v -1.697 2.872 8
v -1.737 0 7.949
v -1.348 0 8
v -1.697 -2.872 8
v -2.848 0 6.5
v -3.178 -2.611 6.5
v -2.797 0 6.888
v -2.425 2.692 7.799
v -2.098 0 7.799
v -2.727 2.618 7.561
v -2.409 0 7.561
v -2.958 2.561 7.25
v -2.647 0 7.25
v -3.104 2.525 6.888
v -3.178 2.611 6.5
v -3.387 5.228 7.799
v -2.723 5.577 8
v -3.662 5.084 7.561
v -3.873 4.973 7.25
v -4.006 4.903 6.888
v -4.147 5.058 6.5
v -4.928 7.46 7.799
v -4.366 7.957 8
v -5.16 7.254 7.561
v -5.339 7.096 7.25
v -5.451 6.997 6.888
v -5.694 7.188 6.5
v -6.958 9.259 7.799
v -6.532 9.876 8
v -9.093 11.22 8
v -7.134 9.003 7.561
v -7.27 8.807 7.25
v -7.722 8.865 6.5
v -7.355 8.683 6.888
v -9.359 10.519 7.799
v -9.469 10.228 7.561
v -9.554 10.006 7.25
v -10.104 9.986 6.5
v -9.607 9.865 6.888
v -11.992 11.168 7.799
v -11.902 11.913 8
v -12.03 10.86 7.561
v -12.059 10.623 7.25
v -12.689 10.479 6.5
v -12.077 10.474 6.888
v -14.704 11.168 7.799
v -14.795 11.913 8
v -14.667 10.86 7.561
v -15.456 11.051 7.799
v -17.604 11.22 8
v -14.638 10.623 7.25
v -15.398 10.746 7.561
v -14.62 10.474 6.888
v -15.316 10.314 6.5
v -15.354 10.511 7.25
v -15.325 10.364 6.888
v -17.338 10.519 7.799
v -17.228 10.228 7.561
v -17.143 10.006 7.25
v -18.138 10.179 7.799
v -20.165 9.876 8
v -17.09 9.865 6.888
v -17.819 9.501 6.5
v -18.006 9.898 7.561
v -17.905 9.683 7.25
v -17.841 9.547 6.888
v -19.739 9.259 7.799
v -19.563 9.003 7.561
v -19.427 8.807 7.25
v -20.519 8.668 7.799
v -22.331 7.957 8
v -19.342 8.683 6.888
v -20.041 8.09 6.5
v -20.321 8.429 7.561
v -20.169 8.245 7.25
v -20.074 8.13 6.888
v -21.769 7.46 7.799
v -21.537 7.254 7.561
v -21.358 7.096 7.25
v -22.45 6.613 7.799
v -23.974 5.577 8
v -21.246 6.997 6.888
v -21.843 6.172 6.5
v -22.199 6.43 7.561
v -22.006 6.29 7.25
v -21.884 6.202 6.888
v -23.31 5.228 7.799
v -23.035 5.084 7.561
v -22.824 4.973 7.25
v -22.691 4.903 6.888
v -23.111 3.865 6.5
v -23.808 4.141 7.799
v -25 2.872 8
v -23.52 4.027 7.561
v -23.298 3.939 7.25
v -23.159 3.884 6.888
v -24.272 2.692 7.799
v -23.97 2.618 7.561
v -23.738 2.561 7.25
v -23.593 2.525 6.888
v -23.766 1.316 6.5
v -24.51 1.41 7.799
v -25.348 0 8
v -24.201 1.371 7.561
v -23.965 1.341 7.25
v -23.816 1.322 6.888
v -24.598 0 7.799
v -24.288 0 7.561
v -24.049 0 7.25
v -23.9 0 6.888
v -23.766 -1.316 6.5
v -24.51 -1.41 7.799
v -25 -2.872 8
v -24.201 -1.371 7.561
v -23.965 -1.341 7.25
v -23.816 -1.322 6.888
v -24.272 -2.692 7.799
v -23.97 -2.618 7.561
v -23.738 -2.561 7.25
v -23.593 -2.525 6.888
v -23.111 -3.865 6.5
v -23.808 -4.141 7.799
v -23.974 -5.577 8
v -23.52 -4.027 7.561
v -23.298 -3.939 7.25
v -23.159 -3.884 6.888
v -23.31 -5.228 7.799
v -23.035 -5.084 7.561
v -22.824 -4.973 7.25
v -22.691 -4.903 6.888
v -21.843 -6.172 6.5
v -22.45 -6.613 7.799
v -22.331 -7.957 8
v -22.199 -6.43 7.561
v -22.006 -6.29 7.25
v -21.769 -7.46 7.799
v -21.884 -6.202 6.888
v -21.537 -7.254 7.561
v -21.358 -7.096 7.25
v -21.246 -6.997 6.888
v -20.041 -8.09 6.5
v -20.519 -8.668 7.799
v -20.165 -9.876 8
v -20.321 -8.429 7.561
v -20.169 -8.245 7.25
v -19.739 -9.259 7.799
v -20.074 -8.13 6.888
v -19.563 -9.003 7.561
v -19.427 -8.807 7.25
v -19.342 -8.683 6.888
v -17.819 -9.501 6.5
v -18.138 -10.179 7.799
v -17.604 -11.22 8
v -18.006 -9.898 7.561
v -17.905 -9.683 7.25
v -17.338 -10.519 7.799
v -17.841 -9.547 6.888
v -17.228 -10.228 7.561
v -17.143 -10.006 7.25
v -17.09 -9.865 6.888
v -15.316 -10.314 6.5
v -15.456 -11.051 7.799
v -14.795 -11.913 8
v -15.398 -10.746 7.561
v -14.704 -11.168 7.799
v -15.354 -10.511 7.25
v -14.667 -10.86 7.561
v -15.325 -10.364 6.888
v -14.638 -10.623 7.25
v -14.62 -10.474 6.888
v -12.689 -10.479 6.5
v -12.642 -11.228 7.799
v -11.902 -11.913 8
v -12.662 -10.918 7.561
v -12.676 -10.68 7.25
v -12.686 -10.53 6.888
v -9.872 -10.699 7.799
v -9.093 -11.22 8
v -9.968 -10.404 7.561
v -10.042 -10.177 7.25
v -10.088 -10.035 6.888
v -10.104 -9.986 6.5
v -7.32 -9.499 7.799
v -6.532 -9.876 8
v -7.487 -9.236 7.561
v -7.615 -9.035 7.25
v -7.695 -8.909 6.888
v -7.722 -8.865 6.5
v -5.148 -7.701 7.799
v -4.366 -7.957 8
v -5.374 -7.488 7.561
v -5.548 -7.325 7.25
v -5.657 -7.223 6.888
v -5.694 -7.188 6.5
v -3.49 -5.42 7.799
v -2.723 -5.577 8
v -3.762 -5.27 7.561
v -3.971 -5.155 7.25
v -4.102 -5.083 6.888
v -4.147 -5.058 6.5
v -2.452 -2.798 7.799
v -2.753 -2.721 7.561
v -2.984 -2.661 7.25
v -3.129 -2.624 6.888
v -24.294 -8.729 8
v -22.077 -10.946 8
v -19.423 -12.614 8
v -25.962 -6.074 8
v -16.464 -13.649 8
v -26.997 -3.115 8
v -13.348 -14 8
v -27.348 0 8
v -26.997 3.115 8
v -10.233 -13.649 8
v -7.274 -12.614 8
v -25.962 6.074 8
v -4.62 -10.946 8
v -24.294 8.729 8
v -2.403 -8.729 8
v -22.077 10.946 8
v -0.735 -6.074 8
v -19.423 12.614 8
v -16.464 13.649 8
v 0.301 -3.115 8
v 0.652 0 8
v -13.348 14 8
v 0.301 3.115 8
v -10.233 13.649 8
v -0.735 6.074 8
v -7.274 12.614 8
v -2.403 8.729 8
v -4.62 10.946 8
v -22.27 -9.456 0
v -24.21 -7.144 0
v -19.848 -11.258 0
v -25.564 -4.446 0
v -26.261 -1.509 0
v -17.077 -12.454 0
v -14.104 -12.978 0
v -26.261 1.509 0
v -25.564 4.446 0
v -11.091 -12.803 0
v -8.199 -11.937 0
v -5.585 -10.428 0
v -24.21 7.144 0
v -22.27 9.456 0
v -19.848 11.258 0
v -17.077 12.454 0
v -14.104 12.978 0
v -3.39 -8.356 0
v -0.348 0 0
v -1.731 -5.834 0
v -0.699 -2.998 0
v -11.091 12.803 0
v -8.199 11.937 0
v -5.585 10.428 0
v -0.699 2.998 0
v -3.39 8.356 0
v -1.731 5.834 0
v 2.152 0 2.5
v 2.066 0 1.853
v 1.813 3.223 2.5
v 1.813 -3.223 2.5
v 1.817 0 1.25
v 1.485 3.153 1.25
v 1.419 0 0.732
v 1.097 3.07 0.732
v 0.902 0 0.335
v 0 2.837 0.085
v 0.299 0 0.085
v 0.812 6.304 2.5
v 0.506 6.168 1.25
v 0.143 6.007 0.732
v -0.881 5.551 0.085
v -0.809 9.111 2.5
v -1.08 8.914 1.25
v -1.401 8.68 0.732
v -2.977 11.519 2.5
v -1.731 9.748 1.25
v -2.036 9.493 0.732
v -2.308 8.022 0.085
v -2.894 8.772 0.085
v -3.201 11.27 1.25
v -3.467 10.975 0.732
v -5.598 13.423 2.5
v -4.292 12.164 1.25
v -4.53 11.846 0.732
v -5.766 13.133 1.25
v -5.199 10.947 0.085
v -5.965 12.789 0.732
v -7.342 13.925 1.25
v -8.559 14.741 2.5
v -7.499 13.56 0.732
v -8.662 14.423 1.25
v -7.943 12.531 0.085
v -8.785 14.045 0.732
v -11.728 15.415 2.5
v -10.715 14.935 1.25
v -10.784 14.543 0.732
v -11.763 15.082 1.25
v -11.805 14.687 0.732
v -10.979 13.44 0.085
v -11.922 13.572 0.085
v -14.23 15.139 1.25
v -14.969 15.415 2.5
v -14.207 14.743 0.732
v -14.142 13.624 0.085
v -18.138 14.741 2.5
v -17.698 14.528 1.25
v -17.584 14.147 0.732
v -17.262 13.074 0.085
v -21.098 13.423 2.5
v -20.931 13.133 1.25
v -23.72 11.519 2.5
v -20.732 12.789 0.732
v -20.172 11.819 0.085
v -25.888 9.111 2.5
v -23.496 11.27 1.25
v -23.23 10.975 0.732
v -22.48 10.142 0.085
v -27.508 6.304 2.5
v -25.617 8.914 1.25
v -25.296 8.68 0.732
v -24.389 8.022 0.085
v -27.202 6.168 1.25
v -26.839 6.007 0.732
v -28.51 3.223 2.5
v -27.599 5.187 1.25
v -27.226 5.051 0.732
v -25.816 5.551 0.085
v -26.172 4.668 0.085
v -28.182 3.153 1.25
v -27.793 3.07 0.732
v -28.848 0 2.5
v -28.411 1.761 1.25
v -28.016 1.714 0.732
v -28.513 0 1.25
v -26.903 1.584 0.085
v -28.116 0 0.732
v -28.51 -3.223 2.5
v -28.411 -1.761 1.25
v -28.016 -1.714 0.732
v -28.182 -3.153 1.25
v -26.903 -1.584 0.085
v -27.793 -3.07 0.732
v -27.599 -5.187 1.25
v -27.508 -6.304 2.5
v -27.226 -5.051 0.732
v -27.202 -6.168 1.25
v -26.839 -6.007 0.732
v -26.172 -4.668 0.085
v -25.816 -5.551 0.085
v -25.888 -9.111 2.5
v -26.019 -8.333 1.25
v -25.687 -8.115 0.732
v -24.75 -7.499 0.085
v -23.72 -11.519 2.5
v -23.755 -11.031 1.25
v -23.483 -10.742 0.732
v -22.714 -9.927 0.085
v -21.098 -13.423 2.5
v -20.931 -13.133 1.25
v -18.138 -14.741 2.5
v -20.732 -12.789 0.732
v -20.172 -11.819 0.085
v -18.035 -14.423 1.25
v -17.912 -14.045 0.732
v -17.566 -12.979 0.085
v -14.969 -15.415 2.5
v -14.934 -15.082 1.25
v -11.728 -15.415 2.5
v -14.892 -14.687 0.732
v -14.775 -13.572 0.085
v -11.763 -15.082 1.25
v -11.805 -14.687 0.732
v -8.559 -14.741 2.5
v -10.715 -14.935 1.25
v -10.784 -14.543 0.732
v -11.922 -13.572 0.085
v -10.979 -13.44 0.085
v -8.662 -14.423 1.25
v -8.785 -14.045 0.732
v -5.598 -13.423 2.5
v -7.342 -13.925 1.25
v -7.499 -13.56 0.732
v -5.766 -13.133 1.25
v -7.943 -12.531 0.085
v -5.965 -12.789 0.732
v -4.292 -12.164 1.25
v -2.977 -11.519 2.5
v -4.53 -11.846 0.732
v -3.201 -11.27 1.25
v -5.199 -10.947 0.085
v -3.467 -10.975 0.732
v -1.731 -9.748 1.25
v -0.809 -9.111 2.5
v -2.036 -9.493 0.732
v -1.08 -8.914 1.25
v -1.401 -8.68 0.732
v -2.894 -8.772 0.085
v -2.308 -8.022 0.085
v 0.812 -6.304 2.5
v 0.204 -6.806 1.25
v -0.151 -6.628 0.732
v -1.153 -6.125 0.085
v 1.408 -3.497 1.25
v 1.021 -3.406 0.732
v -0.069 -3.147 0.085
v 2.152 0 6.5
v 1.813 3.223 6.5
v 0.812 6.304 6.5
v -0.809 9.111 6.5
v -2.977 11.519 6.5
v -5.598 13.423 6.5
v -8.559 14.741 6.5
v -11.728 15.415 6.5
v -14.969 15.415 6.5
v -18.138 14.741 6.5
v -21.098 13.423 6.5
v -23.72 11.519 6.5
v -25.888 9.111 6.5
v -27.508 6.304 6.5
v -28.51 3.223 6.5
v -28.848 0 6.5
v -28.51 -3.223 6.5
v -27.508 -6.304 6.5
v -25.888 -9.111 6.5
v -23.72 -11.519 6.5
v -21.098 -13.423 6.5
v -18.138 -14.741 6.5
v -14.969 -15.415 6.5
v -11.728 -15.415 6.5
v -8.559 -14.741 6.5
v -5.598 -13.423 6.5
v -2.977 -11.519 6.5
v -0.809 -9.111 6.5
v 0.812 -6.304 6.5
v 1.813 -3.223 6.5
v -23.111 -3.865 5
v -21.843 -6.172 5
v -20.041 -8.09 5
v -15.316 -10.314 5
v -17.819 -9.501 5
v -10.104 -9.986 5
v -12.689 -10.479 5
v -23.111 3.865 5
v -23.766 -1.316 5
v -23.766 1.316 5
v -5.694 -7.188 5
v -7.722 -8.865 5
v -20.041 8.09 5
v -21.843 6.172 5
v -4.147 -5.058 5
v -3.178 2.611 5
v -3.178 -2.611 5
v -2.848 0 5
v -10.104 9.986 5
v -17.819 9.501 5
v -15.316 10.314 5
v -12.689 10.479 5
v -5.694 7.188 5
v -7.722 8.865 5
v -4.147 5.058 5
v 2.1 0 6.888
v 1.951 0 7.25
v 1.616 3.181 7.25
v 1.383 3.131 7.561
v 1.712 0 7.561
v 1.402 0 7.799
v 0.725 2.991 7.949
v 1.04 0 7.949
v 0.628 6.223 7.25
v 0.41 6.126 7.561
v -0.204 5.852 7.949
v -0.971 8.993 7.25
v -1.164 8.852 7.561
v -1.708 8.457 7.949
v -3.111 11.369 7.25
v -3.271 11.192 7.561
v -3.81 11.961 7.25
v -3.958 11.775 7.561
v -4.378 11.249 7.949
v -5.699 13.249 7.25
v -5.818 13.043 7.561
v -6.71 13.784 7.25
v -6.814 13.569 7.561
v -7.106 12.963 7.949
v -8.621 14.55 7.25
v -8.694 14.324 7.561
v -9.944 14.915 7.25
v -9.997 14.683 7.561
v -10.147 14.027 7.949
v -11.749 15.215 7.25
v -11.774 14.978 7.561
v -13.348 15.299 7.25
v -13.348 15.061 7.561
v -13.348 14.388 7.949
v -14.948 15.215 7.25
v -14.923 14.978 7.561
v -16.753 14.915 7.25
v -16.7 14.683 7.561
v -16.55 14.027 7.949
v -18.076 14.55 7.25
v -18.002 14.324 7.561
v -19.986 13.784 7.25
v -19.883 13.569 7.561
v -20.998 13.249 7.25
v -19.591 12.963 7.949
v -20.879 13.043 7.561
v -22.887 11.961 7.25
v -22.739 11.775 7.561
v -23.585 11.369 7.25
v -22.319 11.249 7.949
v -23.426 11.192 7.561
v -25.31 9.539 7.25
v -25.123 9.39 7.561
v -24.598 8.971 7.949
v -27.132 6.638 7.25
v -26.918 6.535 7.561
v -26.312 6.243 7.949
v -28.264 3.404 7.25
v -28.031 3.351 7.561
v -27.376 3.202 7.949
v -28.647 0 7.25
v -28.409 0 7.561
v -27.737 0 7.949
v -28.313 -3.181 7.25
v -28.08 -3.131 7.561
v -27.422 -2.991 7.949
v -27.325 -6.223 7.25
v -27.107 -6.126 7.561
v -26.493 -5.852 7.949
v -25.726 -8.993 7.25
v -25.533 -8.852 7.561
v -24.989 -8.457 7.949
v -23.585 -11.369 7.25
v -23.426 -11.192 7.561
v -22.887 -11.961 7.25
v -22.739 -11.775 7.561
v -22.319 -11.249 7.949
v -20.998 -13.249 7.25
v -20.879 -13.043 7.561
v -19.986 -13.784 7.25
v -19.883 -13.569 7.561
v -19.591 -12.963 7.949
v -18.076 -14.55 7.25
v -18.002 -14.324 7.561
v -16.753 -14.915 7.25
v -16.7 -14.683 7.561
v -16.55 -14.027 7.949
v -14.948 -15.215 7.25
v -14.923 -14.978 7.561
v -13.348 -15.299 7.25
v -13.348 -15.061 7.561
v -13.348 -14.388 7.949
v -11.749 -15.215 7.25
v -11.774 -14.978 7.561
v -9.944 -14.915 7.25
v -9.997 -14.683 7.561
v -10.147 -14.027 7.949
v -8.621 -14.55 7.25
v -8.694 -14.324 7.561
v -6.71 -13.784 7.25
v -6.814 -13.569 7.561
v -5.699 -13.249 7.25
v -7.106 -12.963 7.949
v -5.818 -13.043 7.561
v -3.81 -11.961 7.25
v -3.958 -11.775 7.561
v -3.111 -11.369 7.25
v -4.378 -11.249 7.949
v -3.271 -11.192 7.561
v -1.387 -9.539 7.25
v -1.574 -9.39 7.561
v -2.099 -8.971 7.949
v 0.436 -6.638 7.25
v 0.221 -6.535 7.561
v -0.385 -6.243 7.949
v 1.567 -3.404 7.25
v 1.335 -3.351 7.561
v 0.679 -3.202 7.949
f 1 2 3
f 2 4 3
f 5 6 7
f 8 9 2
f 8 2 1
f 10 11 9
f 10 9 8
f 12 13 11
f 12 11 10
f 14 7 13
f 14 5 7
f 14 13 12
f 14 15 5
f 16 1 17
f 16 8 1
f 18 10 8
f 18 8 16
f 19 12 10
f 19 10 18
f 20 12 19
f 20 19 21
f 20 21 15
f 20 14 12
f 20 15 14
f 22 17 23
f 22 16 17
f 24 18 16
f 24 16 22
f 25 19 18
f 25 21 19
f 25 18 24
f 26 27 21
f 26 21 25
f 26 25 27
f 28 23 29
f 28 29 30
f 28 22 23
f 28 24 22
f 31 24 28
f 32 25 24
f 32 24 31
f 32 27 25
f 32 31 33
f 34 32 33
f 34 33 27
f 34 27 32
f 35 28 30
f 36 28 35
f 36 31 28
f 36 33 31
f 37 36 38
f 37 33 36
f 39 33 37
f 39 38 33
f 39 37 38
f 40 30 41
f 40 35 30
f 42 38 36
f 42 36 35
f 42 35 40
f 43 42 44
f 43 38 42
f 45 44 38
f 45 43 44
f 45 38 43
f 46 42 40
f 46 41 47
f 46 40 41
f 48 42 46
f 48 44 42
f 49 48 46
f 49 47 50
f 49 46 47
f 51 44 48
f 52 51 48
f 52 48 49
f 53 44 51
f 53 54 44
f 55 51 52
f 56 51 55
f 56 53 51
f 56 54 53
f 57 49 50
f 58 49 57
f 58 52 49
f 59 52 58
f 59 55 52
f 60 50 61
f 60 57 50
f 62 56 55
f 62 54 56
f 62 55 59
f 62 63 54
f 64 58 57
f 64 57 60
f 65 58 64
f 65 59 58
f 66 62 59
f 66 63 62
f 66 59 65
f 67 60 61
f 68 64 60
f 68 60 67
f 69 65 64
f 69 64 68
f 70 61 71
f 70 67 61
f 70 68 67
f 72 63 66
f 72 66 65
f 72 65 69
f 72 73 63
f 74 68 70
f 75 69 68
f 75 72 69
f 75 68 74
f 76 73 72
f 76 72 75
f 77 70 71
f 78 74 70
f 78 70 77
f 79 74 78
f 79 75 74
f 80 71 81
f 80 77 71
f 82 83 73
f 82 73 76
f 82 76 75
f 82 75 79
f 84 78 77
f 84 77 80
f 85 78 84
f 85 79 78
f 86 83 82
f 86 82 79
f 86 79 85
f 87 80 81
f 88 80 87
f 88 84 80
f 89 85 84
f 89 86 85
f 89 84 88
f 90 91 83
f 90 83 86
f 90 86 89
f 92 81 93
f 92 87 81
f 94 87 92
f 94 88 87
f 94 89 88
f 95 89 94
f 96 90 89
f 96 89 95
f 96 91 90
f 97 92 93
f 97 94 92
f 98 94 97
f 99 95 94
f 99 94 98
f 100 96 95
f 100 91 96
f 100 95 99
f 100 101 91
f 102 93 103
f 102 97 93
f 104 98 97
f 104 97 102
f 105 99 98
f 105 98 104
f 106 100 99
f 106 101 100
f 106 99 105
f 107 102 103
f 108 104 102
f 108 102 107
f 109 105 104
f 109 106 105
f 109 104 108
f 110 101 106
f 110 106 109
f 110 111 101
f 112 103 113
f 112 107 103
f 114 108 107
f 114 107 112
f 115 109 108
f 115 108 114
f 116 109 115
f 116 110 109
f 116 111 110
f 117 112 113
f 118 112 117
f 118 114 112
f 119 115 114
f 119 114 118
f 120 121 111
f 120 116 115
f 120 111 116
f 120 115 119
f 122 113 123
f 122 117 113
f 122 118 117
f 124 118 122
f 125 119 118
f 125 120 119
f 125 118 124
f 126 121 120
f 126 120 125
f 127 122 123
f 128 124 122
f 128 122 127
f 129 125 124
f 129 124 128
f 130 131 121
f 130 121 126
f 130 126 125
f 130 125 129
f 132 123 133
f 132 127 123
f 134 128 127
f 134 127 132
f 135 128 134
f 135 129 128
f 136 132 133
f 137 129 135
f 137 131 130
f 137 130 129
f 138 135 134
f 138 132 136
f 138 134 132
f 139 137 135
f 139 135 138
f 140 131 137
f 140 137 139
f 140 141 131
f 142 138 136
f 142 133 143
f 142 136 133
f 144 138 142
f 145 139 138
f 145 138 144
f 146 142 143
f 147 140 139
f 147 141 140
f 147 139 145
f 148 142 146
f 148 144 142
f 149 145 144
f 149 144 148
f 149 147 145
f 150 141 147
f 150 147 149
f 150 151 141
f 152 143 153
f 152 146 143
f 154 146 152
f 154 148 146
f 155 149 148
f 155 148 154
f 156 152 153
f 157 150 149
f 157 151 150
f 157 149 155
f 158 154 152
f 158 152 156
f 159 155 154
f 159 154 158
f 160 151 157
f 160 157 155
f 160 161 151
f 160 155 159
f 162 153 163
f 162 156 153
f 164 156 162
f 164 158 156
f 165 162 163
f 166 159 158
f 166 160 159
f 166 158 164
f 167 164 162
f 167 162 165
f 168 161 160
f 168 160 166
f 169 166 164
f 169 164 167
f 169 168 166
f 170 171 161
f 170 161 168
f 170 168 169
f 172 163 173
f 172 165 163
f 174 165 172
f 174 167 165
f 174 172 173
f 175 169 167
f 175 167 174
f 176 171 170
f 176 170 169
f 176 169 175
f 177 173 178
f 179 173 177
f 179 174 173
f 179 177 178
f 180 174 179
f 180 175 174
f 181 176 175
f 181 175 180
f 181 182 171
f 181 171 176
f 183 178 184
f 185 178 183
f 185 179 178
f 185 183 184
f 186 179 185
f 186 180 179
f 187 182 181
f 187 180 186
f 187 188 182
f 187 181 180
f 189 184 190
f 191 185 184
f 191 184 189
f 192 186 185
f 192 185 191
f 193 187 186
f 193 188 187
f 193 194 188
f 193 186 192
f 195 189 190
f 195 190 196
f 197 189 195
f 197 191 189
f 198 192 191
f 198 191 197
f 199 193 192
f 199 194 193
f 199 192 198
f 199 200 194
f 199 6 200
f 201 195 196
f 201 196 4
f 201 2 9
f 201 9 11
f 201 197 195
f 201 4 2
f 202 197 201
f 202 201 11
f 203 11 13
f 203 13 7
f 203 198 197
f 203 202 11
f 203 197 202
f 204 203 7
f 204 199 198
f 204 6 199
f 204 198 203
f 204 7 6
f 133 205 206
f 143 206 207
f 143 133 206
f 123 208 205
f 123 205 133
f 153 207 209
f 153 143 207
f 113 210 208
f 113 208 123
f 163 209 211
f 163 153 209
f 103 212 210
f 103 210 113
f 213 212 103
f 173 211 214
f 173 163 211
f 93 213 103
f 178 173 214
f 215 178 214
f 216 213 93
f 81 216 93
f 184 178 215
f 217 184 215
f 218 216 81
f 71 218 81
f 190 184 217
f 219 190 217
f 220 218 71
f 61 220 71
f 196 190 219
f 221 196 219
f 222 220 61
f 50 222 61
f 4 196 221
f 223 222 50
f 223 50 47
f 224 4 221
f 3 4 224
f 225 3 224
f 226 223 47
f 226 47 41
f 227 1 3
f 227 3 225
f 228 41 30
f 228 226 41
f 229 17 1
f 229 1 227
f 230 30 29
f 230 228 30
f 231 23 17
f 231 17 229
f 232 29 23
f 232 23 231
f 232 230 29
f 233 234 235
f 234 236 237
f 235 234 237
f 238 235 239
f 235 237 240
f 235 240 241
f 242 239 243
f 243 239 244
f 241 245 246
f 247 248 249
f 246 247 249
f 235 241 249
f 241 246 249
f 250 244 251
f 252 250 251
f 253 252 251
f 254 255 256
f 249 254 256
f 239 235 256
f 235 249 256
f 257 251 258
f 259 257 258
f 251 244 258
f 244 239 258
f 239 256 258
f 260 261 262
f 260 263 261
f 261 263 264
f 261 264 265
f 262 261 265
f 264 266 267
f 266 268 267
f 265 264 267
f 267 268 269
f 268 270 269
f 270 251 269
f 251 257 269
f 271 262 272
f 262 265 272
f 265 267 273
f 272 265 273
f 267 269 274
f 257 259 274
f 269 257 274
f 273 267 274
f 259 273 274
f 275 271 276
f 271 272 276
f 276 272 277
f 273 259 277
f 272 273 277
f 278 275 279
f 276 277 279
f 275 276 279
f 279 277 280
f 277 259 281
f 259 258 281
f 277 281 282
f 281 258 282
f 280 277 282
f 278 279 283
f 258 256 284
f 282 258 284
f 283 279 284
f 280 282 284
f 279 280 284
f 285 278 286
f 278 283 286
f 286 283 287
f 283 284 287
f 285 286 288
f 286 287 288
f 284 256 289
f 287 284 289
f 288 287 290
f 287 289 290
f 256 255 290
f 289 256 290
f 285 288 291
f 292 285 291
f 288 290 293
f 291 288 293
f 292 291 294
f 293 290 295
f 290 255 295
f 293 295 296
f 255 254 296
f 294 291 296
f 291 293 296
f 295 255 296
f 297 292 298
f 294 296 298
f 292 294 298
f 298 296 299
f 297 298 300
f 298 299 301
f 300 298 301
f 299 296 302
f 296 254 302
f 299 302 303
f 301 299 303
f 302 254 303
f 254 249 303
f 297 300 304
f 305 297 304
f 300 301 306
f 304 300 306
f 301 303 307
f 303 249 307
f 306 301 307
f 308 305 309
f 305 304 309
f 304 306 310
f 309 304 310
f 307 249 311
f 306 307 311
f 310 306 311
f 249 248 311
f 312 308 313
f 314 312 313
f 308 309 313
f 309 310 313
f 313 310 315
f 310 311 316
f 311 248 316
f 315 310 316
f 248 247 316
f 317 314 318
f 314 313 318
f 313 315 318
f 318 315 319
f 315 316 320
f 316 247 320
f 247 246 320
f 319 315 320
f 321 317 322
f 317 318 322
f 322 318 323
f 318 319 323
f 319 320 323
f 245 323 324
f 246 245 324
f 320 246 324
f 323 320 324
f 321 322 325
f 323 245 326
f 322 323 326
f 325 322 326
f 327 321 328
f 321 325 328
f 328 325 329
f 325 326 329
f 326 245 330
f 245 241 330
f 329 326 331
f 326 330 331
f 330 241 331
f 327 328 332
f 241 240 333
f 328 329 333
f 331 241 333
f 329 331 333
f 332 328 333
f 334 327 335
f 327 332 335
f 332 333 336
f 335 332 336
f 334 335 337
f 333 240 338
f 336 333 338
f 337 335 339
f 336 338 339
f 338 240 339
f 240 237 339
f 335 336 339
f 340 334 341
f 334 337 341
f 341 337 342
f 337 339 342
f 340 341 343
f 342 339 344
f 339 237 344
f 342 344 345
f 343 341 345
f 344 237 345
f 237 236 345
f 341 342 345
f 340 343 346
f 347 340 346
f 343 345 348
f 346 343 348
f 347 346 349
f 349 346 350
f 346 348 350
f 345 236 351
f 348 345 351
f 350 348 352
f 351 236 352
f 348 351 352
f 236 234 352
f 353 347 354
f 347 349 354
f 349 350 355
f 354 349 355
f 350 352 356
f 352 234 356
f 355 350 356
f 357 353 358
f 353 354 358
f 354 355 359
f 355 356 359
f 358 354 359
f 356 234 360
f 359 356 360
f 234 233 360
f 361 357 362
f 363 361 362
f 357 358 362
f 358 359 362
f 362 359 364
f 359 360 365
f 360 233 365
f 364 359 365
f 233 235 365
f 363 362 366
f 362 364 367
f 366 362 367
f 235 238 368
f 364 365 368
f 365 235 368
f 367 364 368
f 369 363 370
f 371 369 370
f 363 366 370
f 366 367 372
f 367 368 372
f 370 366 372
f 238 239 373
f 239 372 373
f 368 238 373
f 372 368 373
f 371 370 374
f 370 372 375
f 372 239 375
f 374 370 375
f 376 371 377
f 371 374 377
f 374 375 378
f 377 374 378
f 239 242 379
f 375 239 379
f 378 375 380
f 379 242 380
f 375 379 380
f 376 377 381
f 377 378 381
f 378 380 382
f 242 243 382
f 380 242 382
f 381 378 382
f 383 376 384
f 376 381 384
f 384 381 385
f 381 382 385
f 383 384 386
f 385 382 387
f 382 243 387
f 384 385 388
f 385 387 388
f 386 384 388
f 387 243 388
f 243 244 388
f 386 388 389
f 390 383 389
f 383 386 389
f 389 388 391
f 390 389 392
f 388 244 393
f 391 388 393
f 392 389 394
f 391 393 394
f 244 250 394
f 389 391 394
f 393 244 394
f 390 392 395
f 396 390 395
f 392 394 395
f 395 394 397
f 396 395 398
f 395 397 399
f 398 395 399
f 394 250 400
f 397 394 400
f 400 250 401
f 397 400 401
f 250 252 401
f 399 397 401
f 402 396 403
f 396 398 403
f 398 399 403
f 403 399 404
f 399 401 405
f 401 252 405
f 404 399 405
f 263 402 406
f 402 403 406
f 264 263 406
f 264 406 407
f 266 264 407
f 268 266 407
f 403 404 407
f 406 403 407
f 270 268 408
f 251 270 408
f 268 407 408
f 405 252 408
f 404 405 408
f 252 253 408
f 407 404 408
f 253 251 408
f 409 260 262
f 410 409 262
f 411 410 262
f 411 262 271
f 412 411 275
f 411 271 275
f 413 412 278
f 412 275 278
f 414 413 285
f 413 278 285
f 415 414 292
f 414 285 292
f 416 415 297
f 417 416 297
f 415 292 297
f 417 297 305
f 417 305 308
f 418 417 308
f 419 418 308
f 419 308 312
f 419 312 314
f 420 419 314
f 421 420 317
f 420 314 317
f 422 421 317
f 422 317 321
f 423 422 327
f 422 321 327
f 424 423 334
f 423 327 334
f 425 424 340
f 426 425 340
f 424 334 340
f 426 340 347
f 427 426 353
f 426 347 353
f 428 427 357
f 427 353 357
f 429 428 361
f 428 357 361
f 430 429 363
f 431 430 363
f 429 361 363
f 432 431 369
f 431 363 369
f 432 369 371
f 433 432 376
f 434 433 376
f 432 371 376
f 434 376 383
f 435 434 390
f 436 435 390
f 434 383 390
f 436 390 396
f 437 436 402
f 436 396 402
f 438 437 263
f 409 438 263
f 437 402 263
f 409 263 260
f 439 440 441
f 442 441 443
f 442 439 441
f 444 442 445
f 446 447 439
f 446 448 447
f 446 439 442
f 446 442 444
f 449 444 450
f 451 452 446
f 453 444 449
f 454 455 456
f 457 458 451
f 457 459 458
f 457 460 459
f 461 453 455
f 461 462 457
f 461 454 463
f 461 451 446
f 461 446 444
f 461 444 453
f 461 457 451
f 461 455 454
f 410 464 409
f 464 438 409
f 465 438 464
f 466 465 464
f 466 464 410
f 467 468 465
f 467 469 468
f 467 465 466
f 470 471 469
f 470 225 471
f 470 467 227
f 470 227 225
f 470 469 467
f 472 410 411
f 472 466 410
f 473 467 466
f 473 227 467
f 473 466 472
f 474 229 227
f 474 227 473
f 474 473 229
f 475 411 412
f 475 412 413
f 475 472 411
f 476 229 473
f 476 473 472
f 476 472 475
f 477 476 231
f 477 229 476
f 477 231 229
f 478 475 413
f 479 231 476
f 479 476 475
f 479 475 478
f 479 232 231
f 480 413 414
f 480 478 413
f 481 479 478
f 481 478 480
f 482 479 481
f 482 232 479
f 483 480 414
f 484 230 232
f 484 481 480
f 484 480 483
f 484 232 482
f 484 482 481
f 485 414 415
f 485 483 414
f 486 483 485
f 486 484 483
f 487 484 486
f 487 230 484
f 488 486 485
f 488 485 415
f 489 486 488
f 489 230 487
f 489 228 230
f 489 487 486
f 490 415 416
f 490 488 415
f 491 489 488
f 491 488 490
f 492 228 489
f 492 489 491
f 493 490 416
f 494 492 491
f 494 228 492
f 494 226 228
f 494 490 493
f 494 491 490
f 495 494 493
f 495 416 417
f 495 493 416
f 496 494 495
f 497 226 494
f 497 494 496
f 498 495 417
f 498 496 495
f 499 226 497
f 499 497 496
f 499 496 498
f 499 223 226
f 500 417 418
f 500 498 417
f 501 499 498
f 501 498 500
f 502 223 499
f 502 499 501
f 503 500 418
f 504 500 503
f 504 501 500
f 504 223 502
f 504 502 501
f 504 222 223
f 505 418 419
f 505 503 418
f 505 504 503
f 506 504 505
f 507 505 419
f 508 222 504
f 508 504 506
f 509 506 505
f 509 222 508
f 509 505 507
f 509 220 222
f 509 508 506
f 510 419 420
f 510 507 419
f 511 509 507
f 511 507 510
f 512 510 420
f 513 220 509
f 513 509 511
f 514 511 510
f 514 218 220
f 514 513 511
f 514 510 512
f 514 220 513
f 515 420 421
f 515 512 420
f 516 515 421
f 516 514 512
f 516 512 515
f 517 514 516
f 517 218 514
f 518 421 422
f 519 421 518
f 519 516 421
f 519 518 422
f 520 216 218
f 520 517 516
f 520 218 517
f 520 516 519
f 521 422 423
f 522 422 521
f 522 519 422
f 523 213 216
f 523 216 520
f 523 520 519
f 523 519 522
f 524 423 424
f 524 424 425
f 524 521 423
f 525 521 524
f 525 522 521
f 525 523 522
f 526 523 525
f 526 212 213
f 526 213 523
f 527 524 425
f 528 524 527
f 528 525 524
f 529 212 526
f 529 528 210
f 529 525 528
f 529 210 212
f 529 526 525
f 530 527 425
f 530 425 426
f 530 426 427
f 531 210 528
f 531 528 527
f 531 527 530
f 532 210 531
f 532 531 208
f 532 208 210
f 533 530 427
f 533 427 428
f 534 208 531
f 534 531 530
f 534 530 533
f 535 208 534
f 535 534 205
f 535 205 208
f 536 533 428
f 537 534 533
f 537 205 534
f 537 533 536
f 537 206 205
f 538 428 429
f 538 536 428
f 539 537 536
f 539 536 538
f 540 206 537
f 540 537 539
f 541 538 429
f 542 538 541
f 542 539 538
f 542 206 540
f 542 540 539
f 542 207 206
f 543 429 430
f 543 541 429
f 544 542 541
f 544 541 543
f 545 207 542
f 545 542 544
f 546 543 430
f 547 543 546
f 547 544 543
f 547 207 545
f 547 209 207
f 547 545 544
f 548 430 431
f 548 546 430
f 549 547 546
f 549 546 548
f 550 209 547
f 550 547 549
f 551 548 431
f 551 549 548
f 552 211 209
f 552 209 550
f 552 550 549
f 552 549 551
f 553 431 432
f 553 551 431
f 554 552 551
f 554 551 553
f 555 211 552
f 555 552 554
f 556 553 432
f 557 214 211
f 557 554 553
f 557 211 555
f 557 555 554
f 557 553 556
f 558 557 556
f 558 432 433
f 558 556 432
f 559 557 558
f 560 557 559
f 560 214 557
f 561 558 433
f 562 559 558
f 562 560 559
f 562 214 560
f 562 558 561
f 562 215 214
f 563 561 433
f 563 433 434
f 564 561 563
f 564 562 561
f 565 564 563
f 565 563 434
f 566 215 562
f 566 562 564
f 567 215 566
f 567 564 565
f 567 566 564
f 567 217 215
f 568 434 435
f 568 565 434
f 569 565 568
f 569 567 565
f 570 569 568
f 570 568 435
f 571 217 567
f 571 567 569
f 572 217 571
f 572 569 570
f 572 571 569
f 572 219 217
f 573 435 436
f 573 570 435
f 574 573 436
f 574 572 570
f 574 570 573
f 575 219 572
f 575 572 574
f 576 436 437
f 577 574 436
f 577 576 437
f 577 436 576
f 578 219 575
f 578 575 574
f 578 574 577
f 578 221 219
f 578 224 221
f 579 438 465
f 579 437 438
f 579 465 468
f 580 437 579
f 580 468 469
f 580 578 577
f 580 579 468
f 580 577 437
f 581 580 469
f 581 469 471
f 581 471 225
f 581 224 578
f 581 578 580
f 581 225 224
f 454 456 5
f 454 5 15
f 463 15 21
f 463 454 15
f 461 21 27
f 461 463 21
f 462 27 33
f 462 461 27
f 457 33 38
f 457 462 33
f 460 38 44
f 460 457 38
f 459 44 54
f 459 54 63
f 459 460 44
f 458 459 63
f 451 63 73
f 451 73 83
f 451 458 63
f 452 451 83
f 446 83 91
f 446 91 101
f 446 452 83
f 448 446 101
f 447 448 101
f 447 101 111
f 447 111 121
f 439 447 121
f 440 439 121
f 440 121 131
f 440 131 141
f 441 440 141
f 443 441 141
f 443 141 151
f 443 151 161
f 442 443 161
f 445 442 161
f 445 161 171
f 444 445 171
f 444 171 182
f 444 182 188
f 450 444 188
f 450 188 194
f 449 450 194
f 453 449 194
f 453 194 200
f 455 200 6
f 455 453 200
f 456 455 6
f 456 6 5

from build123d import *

# Parameters (mm, degrees)
F0_R     = 15.5
F1_DEPTH = 8
F2_T     = -5
F3_R     = 1.5
F4_R     = 2.5


with BuildPart() as f1:
    # F0 (on Top) → F1 (new body)
    with BuildSketch(Plane.XY):
        with Locations((-13.3484182879, 0)):
            Circle(F0_R)
    extrude(amount=F1_DEPTH)

    # F2
    f2_openings = [f1.faces().sort_by_distance(p)[0] for p in [
        (-13.348418, 0, 8),
    ]]
    offset(amount=F2_T, openings=f2_openings)

    # F3
    f3_edges = [f1.edges().sort_by_distance(p)[0] for p in [
        (-28.848418, 0, 8),
        (-23.848418, 0, 8),
    ]]
    fillet(f3_edges, radius=F3_R)

    # F4
    f4_edges = [f1.edges().sort_by_distance(p)[0] for p in [
        (-28.848418, 0, 0),
    ]]
    fillet(f4_edges, radius=F4_R)


solid = f1.part
